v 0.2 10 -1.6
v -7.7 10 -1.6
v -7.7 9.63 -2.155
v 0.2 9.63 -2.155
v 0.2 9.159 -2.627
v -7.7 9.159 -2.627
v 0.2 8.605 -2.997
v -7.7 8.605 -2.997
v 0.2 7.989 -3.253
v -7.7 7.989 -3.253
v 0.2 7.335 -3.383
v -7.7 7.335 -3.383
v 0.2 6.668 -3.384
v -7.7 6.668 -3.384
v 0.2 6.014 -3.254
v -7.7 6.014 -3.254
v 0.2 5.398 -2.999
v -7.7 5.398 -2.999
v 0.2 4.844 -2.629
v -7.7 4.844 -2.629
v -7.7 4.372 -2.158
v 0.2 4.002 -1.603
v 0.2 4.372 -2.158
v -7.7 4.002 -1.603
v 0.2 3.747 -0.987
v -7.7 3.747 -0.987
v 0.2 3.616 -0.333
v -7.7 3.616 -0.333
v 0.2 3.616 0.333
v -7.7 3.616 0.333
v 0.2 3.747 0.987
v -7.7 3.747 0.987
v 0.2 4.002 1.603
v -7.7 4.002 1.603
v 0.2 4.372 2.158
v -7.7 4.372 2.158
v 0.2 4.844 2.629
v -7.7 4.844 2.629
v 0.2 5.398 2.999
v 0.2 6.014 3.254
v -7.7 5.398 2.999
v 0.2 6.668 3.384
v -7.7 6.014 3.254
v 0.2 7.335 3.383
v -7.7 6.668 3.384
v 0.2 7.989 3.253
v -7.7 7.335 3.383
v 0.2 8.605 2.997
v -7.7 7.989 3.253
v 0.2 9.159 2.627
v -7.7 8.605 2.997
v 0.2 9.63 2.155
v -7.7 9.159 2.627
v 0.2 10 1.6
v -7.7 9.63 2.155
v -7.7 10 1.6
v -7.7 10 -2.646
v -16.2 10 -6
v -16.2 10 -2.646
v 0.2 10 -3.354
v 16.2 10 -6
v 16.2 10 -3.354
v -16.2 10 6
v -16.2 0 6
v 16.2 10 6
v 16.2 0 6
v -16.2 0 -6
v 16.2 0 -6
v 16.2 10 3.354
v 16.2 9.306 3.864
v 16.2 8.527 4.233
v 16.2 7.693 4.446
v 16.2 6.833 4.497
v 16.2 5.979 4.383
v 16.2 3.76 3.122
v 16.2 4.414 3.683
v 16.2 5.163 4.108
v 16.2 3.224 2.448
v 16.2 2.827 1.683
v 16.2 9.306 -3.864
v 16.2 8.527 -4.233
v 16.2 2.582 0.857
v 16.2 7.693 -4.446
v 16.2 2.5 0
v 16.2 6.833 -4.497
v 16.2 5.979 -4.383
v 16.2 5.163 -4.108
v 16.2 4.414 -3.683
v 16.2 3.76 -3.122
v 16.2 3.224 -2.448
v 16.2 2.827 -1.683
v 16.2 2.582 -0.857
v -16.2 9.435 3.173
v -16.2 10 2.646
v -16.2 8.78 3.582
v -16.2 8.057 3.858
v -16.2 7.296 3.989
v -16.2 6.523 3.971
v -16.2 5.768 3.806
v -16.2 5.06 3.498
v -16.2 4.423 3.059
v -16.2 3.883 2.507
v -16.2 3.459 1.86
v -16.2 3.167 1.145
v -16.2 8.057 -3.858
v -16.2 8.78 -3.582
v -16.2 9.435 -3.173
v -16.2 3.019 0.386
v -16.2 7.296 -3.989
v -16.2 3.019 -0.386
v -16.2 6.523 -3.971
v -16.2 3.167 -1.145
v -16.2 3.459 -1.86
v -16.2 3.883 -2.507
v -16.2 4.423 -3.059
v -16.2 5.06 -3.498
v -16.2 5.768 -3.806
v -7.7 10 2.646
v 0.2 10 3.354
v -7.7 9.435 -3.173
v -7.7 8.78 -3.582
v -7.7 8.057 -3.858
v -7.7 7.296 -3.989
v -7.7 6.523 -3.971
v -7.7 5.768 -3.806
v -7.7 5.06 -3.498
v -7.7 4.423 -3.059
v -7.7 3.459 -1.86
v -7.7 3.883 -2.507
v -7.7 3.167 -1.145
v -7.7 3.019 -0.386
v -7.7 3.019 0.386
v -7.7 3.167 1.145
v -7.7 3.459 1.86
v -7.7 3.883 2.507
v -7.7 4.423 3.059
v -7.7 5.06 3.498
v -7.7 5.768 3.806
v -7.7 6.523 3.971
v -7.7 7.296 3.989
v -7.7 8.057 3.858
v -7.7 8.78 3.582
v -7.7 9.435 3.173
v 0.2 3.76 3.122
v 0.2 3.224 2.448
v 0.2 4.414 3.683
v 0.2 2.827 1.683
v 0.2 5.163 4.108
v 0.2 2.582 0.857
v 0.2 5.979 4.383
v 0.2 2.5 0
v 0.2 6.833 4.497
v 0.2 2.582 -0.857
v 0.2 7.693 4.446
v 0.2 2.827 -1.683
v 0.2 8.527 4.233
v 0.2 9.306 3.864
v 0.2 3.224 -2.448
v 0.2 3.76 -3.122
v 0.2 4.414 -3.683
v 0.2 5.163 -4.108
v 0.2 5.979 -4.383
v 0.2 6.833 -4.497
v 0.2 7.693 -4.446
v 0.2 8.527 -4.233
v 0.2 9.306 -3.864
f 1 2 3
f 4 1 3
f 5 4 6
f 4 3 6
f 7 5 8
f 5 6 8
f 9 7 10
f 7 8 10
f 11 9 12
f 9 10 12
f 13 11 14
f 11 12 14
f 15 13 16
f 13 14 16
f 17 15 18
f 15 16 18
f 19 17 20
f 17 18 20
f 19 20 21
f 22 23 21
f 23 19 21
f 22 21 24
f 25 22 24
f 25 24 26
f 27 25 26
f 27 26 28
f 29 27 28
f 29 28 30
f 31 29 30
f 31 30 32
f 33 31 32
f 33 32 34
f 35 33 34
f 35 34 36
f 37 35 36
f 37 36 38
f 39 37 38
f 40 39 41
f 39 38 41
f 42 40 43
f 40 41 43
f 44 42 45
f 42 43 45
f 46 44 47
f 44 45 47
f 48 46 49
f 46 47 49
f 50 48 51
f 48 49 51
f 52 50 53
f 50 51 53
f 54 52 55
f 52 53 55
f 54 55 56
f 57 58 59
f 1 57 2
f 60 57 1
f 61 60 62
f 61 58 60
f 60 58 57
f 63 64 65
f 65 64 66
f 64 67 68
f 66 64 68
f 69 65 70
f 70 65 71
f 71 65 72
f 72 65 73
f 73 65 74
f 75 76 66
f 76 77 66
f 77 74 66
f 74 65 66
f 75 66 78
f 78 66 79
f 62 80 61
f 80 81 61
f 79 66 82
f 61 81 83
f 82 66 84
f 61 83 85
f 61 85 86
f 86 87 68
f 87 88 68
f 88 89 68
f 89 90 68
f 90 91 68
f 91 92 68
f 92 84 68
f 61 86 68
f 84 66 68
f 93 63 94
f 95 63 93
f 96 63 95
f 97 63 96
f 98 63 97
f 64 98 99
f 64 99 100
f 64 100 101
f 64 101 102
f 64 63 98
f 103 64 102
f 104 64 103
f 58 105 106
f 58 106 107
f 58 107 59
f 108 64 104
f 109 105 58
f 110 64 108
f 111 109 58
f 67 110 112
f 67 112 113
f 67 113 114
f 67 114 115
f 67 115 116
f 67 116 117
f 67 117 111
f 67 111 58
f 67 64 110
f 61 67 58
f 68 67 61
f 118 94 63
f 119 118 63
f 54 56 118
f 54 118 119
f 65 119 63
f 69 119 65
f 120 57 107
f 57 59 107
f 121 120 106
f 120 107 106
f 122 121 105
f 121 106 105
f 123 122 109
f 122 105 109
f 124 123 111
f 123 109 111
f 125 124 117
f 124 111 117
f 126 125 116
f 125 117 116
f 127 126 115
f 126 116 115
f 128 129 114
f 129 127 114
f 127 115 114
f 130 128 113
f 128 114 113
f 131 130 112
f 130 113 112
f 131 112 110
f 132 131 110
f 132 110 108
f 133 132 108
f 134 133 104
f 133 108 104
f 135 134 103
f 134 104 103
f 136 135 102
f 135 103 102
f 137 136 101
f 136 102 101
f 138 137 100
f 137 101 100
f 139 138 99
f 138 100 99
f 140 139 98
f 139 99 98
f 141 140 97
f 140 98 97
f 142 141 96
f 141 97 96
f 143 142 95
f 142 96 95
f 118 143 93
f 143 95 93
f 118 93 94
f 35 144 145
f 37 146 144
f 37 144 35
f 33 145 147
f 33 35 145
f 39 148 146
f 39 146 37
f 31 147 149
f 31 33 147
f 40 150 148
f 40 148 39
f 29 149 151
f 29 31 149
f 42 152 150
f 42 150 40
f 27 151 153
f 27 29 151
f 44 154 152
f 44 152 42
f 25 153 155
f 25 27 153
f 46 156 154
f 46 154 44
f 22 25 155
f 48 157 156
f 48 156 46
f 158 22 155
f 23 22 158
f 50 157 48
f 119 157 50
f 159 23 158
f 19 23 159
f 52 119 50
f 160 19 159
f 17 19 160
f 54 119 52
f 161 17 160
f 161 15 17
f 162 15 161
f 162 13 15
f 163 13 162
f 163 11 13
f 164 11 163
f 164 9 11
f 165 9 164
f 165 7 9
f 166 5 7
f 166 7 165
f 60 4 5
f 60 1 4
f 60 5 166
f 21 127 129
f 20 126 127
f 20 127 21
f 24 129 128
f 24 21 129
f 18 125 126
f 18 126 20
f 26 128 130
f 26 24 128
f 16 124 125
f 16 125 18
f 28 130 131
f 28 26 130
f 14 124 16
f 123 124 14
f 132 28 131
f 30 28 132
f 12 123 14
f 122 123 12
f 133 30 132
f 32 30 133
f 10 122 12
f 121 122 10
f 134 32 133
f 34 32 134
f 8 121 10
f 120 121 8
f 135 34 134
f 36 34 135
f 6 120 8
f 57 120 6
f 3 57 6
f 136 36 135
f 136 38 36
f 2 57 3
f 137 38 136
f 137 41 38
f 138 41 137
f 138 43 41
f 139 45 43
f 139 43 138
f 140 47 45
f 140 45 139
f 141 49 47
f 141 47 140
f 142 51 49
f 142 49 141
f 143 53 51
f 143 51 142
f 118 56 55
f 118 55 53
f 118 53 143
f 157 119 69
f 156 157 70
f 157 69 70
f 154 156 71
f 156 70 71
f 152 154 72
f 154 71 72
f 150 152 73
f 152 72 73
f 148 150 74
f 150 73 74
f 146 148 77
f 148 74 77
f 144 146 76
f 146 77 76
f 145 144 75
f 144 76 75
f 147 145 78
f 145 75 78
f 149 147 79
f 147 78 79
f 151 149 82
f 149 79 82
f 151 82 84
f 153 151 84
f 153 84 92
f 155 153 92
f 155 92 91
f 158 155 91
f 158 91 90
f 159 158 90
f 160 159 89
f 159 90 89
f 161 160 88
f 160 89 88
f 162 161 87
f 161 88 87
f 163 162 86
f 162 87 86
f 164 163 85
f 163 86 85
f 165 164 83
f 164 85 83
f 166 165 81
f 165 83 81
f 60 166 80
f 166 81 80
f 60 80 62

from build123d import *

# Parameters (mm, degrees)
SKETCH_1_W          = 32.4
SKETCH_1_H          = 12
EXTRUDE_1_DEPTH     = 10
SKETCH_4_R          = 4
CUT_EXTRUDE_2_DEPTH = 8.5
SKETCH_7_R          = 3.4
CUT_EXTRUDE_3_DEPTH = 7.9
SKETCH_8_R          = 4.5
CUT_EXTRUDE_4_DEPTH = 16


with BuildPart() as part:
    # 草圖1 → 填料-伸長1 (new body)
    with BuildSketch(Plane(origin=(0, 0, 0), x_dir=(1, 0, 0), z_dir=(0, 1, 0))):
        Rectangle(SKETCH_1_W, SKETCH_1_H)
    extrude(amount=EXTRUDE_1_DEPTH)

    # 草圖4 → 除料-伸長2 (cut)
    with BuildSketch(Plane.ZY.offset(16.2)):
        with Locations((0, 7)):
            Circle(SKETCH_4_R)
    extrude(amount=-CUT_EXTRUDE_2_DEPTH, mode=Mode.SUBTRACT)

    # 草圖7 → 除料-伸長3 (cut)
    with BuildSketch(Plane.ZY.offset(7.7)):
        with Locations((0, 7)):
            Circle(SKETCH_7_R)
    extrude(amount=-CUT_EXTRUDE_3_DEPTH, mode=Mode.SUBTRACT)

    # 草圖8 → 除料-伸長4 (cut)
    with BuildSketch(Plane(origin=(16.2, 0, 0), x_dir=(0, 0, -1), z_dir=(1, 0, 0))):
        with Locations((0, 7)):
            Circle(SKETCH_8_R)
    extrude(amount=-CUT_EXTRUDE_4_DEPTH, mode=Mode.SUBTRACT)


solid = part.part
